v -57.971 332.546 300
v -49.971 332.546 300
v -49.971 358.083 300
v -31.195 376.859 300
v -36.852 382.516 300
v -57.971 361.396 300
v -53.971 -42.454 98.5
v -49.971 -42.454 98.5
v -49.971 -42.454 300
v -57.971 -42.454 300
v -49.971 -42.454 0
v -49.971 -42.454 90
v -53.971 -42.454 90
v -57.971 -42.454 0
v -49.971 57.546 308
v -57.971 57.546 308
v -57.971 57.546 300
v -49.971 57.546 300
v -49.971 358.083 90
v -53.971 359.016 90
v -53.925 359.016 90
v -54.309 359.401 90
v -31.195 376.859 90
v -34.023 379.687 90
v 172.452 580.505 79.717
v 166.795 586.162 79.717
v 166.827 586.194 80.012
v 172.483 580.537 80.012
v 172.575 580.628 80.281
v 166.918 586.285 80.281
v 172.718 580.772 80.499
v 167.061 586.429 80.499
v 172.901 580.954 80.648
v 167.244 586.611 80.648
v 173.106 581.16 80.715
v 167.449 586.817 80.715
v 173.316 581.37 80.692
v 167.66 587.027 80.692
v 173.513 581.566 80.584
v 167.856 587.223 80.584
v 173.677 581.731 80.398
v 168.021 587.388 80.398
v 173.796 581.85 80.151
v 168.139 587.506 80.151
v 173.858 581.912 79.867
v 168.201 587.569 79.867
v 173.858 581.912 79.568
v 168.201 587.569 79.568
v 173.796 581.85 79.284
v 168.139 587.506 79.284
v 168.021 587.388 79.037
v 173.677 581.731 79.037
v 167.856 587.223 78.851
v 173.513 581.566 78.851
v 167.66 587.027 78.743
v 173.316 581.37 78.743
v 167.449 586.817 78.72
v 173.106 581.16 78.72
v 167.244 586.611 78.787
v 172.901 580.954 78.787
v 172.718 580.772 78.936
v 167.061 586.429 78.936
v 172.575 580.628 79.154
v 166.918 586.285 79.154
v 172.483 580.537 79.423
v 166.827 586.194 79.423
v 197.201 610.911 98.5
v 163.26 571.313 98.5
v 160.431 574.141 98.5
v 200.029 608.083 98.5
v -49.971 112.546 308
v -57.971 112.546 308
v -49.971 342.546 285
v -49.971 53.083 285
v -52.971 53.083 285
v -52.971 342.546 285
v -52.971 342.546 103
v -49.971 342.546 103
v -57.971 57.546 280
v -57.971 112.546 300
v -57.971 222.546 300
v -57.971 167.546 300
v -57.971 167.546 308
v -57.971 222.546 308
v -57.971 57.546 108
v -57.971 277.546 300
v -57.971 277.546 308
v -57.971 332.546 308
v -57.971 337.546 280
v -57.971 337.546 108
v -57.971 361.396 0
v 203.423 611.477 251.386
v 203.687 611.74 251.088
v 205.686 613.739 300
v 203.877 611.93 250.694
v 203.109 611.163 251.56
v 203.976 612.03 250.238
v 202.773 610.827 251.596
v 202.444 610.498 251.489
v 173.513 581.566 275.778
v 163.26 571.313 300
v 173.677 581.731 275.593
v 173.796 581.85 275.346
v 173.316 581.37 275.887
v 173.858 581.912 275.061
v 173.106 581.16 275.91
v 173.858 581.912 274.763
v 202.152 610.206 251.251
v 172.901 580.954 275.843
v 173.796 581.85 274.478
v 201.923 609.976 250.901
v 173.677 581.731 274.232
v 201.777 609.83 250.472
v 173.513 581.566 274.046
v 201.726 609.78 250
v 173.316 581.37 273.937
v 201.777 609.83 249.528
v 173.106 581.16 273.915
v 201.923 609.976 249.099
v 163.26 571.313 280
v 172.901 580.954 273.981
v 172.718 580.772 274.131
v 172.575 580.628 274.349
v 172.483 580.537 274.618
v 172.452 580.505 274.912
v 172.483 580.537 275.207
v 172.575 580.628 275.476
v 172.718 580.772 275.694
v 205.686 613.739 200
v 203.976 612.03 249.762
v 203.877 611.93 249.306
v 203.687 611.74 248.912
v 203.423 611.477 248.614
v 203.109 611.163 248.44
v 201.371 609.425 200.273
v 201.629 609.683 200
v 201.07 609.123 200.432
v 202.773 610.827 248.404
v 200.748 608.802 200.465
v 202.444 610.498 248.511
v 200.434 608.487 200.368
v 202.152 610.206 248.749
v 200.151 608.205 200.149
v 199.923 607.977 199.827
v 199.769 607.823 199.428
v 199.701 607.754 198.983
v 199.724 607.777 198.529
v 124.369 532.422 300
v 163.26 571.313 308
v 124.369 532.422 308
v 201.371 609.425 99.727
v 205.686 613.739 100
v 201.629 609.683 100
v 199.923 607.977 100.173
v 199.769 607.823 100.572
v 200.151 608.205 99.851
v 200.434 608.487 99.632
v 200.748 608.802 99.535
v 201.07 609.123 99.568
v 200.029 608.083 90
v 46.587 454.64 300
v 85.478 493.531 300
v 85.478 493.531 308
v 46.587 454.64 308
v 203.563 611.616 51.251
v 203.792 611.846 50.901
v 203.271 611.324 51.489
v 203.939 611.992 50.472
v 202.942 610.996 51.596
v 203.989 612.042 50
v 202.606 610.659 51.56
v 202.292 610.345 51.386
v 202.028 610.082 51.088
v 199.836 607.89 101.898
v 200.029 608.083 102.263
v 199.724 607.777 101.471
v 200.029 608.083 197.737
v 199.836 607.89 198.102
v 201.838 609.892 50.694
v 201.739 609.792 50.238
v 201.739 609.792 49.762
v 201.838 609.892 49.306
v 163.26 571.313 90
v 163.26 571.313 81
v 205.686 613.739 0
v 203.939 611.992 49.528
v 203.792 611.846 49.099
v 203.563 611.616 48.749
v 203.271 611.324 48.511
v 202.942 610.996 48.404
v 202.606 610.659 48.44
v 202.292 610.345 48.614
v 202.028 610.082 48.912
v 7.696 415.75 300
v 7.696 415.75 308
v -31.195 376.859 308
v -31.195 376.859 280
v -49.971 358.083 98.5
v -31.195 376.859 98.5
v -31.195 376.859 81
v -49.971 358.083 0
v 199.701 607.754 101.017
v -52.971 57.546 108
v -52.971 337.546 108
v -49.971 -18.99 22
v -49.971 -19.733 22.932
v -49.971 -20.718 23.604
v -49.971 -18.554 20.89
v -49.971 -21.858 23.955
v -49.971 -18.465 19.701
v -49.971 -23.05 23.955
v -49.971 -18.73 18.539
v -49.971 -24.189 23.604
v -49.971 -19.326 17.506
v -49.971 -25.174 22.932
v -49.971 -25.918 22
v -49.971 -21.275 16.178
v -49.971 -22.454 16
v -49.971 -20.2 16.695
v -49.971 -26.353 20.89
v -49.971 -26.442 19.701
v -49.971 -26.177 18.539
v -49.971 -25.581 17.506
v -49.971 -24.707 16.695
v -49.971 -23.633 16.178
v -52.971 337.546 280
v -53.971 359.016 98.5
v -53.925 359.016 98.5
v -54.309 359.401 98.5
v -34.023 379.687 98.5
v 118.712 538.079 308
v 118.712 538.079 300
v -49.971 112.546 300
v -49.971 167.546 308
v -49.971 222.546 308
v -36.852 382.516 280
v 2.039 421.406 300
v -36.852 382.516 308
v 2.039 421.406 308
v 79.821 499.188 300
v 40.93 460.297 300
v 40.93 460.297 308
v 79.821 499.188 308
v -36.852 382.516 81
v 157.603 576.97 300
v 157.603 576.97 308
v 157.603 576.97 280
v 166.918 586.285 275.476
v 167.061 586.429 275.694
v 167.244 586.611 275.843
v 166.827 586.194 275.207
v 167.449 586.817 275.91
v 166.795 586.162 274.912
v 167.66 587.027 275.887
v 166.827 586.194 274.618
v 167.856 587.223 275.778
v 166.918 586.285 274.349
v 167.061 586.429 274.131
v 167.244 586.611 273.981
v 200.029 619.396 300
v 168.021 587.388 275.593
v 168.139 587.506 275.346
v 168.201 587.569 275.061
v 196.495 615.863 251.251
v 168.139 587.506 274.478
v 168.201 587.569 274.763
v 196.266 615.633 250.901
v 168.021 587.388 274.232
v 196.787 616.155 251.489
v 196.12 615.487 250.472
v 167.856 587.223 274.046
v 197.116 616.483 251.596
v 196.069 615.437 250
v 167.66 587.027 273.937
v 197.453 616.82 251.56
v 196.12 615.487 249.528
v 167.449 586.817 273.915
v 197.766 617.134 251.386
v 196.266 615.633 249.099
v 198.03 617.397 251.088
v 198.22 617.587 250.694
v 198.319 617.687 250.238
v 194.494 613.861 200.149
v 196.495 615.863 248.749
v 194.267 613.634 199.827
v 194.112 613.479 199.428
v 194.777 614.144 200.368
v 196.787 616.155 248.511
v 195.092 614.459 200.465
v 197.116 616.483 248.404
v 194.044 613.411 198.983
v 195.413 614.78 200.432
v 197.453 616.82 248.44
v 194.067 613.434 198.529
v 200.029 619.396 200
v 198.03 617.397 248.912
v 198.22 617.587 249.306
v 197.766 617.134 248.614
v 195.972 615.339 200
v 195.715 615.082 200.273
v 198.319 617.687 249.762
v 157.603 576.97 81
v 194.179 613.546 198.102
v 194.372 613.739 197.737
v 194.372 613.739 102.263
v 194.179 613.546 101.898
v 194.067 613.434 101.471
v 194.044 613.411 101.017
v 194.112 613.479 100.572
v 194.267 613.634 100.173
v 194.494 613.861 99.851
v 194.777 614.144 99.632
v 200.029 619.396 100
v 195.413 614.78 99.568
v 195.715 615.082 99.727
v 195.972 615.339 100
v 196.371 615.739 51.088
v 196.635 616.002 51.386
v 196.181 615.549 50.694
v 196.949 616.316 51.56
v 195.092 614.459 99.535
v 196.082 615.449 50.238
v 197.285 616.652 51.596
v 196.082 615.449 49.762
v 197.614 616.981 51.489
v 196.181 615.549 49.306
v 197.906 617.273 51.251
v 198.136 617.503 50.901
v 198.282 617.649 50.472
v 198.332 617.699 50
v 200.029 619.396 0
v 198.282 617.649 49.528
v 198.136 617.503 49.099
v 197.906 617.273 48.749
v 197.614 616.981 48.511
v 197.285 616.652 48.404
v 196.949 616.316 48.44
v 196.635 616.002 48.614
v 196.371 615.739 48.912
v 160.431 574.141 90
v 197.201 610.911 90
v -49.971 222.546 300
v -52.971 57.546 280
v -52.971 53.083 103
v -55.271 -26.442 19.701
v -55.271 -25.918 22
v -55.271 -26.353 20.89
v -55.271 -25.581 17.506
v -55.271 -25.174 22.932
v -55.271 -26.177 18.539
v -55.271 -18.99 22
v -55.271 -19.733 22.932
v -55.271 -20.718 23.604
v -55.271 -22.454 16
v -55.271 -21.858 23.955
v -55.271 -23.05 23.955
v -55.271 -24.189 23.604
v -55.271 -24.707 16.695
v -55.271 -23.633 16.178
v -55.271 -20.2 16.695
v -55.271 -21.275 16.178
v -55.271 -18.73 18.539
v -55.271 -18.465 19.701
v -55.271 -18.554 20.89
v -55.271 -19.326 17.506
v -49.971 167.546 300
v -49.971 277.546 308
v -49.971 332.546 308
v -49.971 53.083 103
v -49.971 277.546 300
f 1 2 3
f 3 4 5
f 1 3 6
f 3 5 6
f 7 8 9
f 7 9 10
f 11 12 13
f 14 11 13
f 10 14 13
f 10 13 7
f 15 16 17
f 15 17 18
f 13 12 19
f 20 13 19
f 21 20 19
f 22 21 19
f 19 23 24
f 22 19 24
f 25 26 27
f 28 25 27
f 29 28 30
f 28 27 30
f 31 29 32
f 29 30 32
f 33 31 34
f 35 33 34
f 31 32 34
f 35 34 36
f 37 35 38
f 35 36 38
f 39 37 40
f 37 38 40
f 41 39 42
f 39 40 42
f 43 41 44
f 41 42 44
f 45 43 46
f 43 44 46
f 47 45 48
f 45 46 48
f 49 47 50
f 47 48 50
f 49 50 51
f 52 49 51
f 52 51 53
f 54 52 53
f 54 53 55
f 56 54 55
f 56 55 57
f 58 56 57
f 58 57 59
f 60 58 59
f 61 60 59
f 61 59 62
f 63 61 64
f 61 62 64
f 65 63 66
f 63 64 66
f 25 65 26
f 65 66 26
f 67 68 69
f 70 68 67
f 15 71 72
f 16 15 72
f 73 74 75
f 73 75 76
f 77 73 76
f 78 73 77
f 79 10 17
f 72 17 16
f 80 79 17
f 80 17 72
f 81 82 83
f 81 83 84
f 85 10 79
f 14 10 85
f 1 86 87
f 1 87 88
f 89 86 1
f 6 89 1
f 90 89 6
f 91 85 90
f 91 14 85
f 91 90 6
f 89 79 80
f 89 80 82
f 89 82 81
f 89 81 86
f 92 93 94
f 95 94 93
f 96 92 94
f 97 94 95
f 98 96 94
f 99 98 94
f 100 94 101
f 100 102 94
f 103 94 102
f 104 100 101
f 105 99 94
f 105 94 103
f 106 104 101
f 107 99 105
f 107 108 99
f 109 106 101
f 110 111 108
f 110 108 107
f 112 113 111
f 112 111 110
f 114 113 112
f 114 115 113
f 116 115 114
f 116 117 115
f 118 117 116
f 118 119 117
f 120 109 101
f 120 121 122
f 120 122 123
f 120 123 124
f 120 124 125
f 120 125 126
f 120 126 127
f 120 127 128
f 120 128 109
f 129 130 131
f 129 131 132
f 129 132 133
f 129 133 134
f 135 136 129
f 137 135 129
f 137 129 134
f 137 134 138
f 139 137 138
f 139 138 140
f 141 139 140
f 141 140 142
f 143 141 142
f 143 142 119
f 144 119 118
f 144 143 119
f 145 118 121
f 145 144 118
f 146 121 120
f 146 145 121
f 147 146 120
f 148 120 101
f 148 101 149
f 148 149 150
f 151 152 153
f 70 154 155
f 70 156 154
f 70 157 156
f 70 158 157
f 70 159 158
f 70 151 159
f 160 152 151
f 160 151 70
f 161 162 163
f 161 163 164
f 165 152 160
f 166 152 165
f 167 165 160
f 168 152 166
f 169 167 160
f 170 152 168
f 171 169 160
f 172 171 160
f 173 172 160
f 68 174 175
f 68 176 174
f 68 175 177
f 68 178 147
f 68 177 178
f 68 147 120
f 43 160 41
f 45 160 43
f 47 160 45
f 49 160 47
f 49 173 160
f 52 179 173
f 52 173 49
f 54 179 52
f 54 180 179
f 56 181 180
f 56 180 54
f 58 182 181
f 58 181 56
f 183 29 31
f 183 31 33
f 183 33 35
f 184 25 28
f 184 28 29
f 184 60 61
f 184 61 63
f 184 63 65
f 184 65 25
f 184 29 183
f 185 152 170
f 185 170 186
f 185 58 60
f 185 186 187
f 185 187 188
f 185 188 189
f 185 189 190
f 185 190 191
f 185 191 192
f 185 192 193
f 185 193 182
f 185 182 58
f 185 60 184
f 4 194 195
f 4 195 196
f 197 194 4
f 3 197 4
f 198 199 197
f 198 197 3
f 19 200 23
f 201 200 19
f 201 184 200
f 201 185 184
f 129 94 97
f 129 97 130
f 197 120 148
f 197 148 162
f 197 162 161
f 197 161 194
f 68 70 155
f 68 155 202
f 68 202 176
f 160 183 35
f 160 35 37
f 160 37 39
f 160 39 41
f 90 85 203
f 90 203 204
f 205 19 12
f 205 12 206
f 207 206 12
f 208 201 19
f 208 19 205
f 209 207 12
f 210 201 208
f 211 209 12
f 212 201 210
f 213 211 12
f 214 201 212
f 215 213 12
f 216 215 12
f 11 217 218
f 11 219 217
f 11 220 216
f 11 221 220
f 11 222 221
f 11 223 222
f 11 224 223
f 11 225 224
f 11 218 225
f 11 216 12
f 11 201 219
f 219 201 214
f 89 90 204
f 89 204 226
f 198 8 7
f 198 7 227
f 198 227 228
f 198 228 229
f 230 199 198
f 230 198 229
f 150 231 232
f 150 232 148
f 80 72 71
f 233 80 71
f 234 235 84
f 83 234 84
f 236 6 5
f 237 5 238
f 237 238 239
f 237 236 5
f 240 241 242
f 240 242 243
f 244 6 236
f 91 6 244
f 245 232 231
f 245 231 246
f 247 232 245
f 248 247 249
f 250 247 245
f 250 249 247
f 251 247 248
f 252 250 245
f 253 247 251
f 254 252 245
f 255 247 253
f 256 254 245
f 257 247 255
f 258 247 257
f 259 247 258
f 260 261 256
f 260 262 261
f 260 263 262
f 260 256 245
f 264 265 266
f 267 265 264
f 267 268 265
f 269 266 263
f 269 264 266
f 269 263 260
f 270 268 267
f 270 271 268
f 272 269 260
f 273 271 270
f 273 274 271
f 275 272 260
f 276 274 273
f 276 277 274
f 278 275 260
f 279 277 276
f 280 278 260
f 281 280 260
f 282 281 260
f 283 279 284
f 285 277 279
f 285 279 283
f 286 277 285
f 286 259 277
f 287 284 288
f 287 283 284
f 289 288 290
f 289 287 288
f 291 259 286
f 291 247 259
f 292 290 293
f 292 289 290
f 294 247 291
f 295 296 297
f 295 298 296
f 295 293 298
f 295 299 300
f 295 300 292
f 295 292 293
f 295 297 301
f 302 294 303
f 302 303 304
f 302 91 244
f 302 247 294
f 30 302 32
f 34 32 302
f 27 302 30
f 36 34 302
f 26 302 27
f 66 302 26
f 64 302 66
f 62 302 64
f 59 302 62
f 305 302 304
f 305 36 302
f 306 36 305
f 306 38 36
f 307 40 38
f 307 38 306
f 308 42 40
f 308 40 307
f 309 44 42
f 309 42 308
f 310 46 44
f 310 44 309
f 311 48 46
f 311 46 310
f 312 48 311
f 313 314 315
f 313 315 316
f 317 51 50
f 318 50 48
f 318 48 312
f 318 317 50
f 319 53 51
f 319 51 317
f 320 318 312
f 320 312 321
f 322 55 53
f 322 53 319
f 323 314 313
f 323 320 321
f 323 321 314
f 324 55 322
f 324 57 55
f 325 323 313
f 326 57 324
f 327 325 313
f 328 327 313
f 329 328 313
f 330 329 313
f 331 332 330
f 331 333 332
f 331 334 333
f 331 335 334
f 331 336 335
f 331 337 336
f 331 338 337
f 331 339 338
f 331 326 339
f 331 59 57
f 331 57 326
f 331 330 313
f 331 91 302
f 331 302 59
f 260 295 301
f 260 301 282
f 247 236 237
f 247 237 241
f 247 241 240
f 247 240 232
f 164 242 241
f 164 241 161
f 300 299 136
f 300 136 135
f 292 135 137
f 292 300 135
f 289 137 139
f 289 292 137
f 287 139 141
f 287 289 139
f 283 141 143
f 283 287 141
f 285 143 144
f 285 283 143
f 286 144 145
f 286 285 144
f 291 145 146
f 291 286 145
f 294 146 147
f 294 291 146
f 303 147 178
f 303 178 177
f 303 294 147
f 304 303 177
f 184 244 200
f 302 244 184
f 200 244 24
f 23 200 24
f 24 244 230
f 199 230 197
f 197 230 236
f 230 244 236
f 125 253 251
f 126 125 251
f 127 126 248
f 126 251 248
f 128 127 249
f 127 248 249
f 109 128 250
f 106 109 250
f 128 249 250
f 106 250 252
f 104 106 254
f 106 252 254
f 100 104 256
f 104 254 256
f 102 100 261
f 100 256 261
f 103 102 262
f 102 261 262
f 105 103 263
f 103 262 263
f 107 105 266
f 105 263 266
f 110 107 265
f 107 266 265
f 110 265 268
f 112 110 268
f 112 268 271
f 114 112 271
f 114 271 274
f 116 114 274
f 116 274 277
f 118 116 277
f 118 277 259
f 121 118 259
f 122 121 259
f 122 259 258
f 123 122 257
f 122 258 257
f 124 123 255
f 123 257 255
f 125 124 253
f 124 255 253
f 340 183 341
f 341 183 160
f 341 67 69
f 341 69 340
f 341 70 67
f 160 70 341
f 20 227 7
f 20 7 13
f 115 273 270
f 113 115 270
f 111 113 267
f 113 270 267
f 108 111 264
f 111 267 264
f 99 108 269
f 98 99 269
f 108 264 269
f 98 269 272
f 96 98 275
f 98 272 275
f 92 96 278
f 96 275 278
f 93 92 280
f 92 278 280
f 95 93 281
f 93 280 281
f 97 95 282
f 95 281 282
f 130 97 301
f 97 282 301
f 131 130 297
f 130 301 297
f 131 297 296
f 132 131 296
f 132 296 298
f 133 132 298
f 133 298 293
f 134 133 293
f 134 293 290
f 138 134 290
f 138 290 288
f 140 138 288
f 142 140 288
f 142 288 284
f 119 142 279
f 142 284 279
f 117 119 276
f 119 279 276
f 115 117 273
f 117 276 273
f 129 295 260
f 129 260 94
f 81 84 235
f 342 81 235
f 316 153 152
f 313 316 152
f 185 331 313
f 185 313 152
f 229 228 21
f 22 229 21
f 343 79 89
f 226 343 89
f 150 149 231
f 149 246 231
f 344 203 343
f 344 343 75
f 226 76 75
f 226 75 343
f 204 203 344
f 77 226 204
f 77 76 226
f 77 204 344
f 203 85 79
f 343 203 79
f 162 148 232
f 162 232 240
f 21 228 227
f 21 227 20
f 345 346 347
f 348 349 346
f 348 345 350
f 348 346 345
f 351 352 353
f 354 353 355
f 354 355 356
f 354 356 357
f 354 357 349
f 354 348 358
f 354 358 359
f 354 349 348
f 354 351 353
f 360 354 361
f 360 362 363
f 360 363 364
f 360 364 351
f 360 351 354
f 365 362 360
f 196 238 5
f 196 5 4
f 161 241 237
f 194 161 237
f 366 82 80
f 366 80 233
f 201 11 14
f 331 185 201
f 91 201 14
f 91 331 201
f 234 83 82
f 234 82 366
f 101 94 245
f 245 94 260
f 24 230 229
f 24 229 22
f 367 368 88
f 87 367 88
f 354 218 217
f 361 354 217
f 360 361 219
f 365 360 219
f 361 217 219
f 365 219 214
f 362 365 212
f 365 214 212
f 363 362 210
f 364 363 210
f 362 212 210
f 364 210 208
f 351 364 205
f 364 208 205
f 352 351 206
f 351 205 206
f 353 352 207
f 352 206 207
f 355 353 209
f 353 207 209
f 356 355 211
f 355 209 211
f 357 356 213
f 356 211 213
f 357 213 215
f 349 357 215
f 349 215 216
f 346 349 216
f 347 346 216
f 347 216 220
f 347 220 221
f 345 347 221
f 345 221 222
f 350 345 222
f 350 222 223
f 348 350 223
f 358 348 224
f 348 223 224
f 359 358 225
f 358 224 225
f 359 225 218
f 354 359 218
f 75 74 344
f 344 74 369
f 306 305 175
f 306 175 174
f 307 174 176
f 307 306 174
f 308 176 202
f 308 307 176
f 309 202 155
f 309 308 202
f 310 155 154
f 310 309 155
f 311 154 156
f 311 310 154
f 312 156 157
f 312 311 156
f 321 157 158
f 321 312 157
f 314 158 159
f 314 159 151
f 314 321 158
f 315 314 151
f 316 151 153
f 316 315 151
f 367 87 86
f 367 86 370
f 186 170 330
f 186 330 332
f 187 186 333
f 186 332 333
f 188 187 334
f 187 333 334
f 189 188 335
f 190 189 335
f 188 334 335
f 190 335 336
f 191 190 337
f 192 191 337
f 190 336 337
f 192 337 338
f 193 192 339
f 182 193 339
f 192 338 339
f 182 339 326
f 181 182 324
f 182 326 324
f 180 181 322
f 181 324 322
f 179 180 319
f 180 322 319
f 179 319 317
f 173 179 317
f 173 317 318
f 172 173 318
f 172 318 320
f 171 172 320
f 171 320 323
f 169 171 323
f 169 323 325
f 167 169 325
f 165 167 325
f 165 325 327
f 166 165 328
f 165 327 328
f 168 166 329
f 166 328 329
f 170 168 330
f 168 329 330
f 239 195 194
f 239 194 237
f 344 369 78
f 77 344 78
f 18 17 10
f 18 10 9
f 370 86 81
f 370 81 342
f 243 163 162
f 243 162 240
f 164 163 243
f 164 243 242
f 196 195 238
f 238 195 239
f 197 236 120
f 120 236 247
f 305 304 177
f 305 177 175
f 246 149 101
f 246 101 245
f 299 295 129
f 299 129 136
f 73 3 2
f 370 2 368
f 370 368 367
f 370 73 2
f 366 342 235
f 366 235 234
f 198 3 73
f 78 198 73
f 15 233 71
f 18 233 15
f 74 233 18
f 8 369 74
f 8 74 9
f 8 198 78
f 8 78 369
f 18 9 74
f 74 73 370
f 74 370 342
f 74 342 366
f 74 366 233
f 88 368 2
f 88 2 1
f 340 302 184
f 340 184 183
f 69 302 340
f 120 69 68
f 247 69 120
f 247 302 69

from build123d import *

# Parameters (mm, degrees)
BOSS_EXTRU_1_DEPTH      = 308
ESQUISSE2_W             = 8
ESQUISSE2_H             = 100
ESQUISSE2_H_2           = 55
ENL_V_MAT_EXTRU_1_DEPTH = 8
ESQUISSE3_W             = 172
ESQUISSE3_H             = 280
ENL_V_MAT_EXTRU_2_DEPTH = 532
ESQUISSE4_R             = 1
ESQUISSE4_W             = 199
ESQUISSE4_H             = 275
ENL_V_MAT_EXTRU_3_DEPTH = 8
ESQUISSE5_R             = 1.6
ENL_V_MAT_EXTRU_4_DEPTH = 8
ESQUISSE6_W             = 182
ESQUISSE6_H             = 289.463708499
ENL_V_MAT_EXTRU_5_DEPTH = 3
ESQUISSE7_R             = 4
ENL_V_MAT_EXTRU_6_DEPTH = 5.3
ESQUISSE8_W             = 8.5
ESQUISSE8_H             = 407.758885886
ENL_V_MAT_EXTRU_7_DEPTH = 4
ESQUISSE9_W             = 8.5
ESQUISSE9_H             = 355.689024311
ENL_V_MAT_EXTRU_8_DEPTH = 4


with BuildPart() as part:
    # Esquisse1 → Boss.-Extru.1 (new body)
    with BuildSketch(Plane.XY):
        Polygon((-49.970813456, -42.453670617), (-57.970813456, -42.453670617), (-57.970813456, 361.396329383), (200.029186542, 619.396329381), (205.686040791, 613.739475131), (-49.970813456, 358.082620884), align=None)
    extrude(amount=BOSS_EXTRU_1_DEPTH)

    # Esquisse2 → Enlèv. mat.-Extru.1 (cut)
    with BuildSketch(Plane.XY.offset(308)):
        with Locations((-53.970813456, 7.546329383)):
            Rectangle(ESQUISSE2_W, ESQUISSE2_H)
        Polygon((205.686040791, 613.739475131), (163.25963392, 571.31306826), (157.602779671, 576.96992251), (200.029186542, 619.396329381), align=None)
        with Locations((-53.970813456, 140.046329383)):
            Rectangle(ESQUISSE2_W, ESQUISSE2_H_2)
        with Locations((-53.970813456, 250.046329383)):
            Rectangle(ESQUISSE2_W, ESQUISSE2_H_2)
        Polygon((118.711906706, 538.079049544), (124.368760955, 532.422195295), (85.47788799, 493.53132233), (79.82103374, 499.188176579), align=None)
        Polygon((40.930160775, 460.297303614), (46.587015025, 454.640449364), (7.696142059, 415.749576399), (2.03928781, 421.406430649), align=None)
        Polygon((-36.851585155, 382.515557683), (-31.194730906, 376.858703434), (-49.970813456, 358.082620884), (-49.970813456, 332.546329383), (-57.970813456, 332.546329383), (-57.970813456, 361.396329383), align=None)
    extrude(amount=-ENL_V_MAT_EXTRU_1_DEPTH, mode=Mode.SUBTRACT)

    # Esquisse3 → Enlèv. mat.-Extru.2 (cut)
    with BuildSketch(Plane.ZY.offset(57.970813456)):
        with Locations((194, 197.546329383)):
            Rectangle(ESQUISSE3_W, ESQUISSE3_H)
    extrude(amount=-ENL_V_MAT_EXTRU_2_DEPTH, mode=Mode.SUBTRACT)

    # Esquisse4 → Enlèv. mat.-Extru.3 (cut)
    with BuildSketch(Plane(origin=(-209.683571419, 209.683571419, 0), x_dir=(0, 0, 1), z_dir=(-0.7071067811865465, 0.7071067811865487, 0))):
        with Locations(Location((79.717490694, 533.421338986, 0), (0, 0, 270))):
            Circle(ESQUISSE4_R)
        with Locations(Location((274.912348835, 533.421338986, 0), (0, 0, 270))):
            Circle(ESQUISSE4_R)
        with Locations((180.5, 381.921338986)):
            Rectangle(ESQUISSE4_W, ESQUISSE4_H)
    extrude(amount=-ENL_V_MAT_EXTRU_3_DEPTH, mode=Mode.SUBTRACT)

    # Esquisse5 → Enlèv. mat.-Extru.4 (cut)
    with BuildSketch(Plane(origin=(-209.683571419, 209.683571419, 0), x_dir=(0, 0, 1), z_dir=(-0.7071067811865467, 0.7071067811865485, 0))):
        with Locations(Location((250, 575.421338986, 0), (0, 0, 270))):
            Circle(ESQUISSE5_R)
        with Locations(Location((50, 575.421338986, 0), (0, 0, 90))):
            Circle(ESQUISSE5_R)
        with BuildLine():
            Line((100, 580.669491466), (200, 580.669491466))
            Line((200, 580.669491466), (200, 573.684080686))
            ThreePointArc((200, 573.684080686), (200, 571.421338986), (197.7372583, 571.421338986))
            Line((197.7372583, 571.421338986), (102.2627417, 571.421338986))
            ThreePointArc((102.2627417, 571.421338986), (100, 571.421338986), (100, 573.684080686))
            Line((100, 573.684080686), (100, 580.669491466))
        make_face()
    extrude(amount=-ENL_V_MAT_EXTRU_4_DEPTH, mode=Mode.SUBTRACT)

    # Esquisse6 → Enlèv. mat.-Extru.5 (cut)
    with BuildSketch(Plane(origin=(-49.970813456, 0, 0), x_dir=(0, 0, -1), z_dir=(1, 0, 0))):
        with Locations((-194, 197.814475133)):
            Rectangle(ESQUISSE6_W, ESQUISSE6_H)
    extrude(amount=-ENL_V_MAT_EXTRU_5_DEPTH, mode=Mode.SUBTRACT)

    # Esquisse7 → Enlèv. mat.-Extru.6 (cut)
    with BuildSketch(Plane(origin=(-49.970813456, 0, 0), x_dir=(0, 0, -1), z_dir=(1, 0, 0))):
        with Locations((-20, -22.453670617)):
            Circle(ESQUISSE7_R)
    extrude(amount=-ENL_V_MAT_EXTRU_6_DEPTH, mode=Mode.SUBTRACT)

    # Esquisse8 → Enlèv. mat.-Extru.7 (cut)
    with BuildSketch(Plane(origin=(-49.970813456, 0, 0), x_dir=(0, 0, -1), z_dir=(1, 0, 0))):
        with Locations((-94.25, 155.136885429)):
            Rectangle(ESQUISSE8_W, ESQUISSE8_H)
    extrude(amount=-ENL_V_MAT_EXTRU_7_DEPTH, mode=Mode.SUBTRACT)

    # Esquisse9 → Enlèv. mat.-Extru.8 (cut)
    with BuildSketch(Plane(origin=(-204.02671717, 204.02671717, 0), x_dir=(0, 0, -1), z_dir=(0.7071067811865464, -0.7071067811865487, 0))):
        with Locations((-94.25, 393.576826831)):
            Rectangle(ESQUISSE9_W, ESQUISSE9_H)
    extrude(amount=-ENL_V_MAT_EXTRU_8_DEPTH, mode=Mode.SUBTRACT)


solid = part.part
